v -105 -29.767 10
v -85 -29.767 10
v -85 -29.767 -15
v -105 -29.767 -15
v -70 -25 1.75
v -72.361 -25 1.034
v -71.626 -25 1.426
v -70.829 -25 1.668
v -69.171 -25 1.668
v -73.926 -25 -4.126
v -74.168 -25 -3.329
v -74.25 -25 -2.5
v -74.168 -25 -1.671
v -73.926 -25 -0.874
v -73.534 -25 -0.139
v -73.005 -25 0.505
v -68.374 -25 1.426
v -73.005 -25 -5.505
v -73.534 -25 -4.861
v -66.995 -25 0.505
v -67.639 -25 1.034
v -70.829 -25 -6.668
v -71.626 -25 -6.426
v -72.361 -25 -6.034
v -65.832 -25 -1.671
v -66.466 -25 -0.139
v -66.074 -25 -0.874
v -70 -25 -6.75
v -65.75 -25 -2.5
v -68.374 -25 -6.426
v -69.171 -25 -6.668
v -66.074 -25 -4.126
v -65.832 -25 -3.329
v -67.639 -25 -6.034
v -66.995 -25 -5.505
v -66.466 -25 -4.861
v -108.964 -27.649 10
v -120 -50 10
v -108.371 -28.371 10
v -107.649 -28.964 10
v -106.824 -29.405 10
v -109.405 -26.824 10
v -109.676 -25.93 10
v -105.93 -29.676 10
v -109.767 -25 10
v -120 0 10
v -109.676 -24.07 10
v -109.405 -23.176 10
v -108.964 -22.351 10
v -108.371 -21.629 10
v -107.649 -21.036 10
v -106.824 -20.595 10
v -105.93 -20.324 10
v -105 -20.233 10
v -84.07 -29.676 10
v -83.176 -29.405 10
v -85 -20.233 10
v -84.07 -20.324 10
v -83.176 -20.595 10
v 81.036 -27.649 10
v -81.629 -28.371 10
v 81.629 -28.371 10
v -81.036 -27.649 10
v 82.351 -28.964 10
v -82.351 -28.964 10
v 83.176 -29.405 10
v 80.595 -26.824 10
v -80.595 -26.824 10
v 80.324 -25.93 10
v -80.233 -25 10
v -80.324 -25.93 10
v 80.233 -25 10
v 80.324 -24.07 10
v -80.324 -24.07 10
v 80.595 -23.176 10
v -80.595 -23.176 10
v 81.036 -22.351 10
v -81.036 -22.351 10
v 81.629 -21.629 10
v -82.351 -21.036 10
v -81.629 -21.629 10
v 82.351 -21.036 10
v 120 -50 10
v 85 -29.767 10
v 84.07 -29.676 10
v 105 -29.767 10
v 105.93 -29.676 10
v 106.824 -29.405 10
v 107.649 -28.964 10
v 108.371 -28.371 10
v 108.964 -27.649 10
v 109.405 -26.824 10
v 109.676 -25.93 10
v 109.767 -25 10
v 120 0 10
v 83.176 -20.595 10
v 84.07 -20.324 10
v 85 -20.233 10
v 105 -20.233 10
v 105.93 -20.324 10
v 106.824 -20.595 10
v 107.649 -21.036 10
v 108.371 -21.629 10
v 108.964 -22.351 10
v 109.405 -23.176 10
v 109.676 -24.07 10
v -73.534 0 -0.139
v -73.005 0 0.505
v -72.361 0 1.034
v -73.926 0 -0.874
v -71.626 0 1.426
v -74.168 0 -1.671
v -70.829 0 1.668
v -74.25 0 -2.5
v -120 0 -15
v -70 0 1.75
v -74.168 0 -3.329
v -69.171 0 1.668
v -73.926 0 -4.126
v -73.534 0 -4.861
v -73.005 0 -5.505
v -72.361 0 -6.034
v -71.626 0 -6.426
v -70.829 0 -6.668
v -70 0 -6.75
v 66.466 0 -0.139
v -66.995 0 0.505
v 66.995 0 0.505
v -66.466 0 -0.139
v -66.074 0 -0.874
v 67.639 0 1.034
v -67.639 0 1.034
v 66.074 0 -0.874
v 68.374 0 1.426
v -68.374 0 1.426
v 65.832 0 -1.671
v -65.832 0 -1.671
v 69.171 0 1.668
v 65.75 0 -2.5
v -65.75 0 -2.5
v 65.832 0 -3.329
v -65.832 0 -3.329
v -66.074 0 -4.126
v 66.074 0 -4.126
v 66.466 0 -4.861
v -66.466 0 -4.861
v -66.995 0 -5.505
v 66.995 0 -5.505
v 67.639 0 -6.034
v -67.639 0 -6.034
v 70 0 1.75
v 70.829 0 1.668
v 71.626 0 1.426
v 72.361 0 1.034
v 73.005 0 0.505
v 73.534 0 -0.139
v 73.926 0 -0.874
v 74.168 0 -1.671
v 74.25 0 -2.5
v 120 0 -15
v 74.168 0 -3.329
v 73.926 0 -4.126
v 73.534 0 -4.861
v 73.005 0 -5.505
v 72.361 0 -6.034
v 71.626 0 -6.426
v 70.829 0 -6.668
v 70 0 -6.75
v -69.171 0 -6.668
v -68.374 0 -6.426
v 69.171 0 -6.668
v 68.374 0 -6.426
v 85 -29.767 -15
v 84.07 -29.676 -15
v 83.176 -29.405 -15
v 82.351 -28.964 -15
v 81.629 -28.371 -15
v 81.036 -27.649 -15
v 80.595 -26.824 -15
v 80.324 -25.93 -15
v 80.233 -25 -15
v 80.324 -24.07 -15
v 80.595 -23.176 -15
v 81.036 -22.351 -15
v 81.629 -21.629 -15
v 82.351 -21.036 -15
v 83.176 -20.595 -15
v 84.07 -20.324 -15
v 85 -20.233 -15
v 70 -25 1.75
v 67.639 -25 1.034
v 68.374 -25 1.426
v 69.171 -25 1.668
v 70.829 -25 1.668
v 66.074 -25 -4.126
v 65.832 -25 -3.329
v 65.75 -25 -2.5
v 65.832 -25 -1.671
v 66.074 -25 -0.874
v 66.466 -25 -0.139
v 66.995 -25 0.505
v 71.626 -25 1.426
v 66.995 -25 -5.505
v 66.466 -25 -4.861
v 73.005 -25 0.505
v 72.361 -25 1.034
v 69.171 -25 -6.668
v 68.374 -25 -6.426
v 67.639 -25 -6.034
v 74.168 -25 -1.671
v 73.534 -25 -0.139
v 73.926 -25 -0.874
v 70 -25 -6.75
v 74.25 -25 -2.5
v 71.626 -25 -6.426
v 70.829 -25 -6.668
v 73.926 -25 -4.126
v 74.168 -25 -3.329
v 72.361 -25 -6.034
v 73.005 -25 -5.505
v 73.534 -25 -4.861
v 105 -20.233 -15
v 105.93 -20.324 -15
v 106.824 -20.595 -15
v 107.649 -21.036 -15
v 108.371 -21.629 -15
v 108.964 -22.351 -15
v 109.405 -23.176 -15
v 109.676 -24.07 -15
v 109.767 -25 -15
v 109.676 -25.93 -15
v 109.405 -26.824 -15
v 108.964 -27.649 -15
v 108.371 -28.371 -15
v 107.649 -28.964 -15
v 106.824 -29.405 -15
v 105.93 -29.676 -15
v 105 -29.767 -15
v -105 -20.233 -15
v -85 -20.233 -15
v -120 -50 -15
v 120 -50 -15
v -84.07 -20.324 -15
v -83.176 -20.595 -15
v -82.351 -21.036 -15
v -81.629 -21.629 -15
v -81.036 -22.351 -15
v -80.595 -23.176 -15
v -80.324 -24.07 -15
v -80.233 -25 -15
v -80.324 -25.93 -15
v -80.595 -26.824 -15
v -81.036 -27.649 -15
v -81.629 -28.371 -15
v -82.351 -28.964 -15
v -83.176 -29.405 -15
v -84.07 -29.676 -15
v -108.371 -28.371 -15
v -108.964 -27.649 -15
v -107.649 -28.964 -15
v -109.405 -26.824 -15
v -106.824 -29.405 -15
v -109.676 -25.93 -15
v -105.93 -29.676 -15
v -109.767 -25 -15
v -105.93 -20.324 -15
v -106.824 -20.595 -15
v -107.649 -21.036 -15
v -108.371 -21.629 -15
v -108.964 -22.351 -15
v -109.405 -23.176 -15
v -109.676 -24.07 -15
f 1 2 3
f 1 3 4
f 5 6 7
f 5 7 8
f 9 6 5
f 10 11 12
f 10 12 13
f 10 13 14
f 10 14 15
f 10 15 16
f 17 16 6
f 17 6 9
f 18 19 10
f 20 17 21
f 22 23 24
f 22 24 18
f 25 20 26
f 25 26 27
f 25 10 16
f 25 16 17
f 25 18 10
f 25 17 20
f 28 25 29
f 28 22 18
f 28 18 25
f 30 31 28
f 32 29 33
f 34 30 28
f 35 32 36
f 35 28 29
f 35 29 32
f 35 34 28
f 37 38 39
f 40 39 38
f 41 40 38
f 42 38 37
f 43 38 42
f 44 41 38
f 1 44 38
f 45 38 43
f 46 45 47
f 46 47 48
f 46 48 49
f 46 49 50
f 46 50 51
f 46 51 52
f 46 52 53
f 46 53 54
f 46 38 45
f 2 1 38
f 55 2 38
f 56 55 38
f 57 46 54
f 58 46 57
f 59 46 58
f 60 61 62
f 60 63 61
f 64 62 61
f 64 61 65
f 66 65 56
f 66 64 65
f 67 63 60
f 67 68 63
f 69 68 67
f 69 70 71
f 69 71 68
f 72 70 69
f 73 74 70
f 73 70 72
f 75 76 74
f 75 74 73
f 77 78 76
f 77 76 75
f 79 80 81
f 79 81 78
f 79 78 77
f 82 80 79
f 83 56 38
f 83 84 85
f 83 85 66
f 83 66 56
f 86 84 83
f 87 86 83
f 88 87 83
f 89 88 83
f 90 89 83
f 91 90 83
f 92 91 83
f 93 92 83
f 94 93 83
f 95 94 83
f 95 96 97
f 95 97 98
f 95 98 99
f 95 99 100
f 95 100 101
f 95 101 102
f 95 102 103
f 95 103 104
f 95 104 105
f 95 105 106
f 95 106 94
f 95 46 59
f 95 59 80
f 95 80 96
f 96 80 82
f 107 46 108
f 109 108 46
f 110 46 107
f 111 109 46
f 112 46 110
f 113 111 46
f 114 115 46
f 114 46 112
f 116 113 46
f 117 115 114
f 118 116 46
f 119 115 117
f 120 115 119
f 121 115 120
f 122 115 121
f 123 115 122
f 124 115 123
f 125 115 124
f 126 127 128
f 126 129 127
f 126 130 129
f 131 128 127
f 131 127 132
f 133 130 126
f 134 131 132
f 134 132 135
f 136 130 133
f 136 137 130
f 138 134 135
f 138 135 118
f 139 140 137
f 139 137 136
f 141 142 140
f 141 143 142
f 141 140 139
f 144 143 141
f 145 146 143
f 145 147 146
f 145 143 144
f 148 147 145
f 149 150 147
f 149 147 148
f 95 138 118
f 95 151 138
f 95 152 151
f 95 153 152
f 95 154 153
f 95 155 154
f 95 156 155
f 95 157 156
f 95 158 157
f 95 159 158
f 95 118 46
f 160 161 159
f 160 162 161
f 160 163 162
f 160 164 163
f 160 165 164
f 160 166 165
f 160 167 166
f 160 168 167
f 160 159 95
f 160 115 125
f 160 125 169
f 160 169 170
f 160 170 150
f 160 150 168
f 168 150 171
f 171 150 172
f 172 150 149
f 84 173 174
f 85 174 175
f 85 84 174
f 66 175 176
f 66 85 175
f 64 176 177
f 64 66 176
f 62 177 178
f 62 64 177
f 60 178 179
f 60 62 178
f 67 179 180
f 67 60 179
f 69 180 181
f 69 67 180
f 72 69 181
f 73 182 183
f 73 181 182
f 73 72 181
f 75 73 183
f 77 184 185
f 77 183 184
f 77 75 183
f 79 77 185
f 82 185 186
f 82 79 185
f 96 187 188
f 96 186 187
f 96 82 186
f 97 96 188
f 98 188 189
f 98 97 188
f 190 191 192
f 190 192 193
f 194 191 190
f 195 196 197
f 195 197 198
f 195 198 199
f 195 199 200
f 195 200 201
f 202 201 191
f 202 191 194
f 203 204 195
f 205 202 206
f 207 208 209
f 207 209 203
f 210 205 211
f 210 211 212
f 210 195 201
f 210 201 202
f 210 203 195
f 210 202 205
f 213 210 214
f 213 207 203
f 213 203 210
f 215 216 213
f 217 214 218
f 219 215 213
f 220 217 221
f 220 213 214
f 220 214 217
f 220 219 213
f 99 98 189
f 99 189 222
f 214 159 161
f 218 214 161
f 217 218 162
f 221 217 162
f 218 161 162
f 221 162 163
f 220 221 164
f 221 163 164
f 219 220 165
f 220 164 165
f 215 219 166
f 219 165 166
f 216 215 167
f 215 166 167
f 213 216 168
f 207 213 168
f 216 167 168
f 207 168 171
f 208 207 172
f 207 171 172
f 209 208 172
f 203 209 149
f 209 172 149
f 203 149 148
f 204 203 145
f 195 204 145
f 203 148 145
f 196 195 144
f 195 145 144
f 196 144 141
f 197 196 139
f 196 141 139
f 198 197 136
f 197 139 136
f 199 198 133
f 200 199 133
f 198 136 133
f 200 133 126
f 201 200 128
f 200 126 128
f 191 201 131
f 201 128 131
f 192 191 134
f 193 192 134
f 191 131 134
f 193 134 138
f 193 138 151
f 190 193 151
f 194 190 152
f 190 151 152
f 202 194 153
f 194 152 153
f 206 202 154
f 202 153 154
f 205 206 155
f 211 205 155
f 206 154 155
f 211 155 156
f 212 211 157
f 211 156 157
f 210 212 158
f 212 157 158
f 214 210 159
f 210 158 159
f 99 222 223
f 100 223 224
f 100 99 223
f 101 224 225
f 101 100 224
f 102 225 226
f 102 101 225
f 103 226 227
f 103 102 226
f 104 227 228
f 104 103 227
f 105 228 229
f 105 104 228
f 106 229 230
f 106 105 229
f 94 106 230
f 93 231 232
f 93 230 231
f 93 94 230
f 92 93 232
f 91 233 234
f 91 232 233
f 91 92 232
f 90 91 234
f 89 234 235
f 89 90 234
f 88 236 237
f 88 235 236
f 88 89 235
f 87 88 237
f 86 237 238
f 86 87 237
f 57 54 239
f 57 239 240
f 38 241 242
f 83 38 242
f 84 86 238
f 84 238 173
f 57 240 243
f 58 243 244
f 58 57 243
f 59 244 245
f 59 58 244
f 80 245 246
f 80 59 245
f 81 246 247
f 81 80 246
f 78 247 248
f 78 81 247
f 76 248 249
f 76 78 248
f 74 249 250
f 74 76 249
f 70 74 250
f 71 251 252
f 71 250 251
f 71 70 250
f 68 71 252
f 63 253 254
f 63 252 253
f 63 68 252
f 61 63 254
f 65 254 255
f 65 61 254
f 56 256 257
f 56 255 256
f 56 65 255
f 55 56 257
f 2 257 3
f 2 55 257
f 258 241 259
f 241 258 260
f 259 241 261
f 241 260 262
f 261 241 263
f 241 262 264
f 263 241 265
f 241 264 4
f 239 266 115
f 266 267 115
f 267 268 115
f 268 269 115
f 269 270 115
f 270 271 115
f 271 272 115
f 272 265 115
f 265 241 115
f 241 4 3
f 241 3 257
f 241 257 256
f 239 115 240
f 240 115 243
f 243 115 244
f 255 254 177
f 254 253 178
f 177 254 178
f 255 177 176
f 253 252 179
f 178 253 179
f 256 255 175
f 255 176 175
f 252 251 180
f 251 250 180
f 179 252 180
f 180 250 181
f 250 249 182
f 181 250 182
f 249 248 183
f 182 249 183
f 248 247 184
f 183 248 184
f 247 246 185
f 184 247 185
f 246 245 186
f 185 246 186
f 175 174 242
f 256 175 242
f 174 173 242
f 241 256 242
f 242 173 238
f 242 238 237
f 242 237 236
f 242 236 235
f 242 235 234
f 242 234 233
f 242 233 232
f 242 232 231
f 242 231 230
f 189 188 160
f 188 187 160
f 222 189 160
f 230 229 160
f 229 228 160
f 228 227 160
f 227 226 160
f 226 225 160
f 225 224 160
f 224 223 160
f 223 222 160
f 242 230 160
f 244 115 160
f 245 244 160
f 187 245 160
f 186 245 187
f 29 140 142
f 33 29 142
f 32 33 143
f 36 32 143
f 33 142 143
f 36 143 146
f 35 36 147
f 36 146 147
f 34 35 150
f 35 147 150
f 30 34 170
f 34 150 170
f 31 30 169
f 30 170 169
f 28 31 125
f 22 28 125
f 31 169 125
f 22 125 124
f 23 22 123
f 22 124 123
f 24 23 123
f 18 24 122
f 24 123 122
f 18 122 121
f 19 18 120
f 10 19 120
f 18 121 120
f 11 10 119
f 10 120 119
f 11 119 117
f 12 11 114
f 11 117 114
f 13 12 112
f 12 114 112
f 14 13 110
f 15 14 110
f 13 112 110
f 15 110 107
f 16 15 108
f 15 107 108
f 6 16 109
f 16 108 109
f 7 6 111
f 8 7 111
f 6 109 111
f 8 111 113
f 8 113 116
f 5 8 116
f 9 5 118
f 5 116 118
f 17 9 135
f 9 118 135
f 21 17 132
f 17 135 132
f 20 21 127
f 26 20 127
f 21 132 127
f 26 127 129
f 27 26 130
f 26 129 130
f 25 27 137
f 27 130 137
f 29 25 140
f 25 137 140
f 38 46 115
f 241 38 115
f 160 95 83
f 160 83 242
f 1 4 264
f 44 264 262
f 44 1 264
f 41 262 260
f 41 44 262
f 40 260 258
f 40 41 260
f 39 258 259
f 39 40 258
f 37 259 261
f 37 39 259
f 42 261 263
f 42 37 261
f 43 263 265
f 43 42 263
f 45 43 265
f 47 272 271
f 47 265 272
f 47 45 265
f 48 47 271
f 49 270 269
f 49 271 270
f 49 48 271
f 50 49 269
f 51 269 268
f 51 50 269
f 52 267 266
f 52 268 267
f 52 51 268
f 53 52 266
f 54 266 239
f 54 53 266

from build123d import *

# Parameters (mm, degrees)
CROQUIS1_W              = 240
CROQUIS1_H              = 25
SALIENTE_EXTRUIR1_DEPTH = 50
CROQUIS2_R              = 4.25
CORTAR_EXTRUIR1_DEPTH   = 25
CORTAR_EXTRUIR3_DEPTH   = 26


with BuildPart() as part:
    # Croquis1 → Saliente-Extruir1 (new body)
    with BuildSketch(Plane(origin=(0, 0, 0), x_dir=(1, 0, 0), z_dir=(0, 1, 0))):
        with Locations((0, 2.5)):
            Rectangle(CROQUIS1_W, CROQUIS1_H)
    extrude(amount=-SALIENTE_EXTRUIR1_DEPTH)

    # Croquis2 → Cortar-Extruir1 (cut)
    with BuildSketch(Plane(origin=(0, 0, 0), x_dir=(1, 0, 0), z_dir=(0, 1, 0))):
        with Locations((-70, 2.5)):
            Circle(CROQUIS2_R)
        with Locations((70, 2.5)):
            Circle(CROQUIS2_R)
    extrude(amount=-CORTAR_EXTRUIR1_DEPTH, mode=Mode.SUBTRACT)

    # Croquis3 → Cortar-Extruir3 (cut, through all)
    with BuildSketch(Plane.XY.offset(10)):
        with BuildLine():
            Line((-105, -20.232520372), (-85, -20.232520372))
            ThreePointArc((-85, -20.232520372), (-80.232520372, -25), (-85, -29.767479628))
            Line((-85, -29.767479628), (-105, -29.767479628))
            ThreePointArc((-105, -29.767479628), (-109.767479628, -25), (-105, -20.232520372))
        make_face()
        with BuildLine():
            Line((85, -20.232520372), (105, -20.232520372))
            ThreePointArc((105, -20.232520372), (109.767479628, -25), (105, -29.767479628))
            Line((105, -29.767479628), (85, -29.767479628))
            ThreePointArc((85, -29.767479628), (80.232520372, -25), (85, -20.232520372))
        make_face()
    extrude(amount=-CORTAR_EXTRUIR3_DEPTH, mode=Mode.SUBTRACT)


solid = part.part
